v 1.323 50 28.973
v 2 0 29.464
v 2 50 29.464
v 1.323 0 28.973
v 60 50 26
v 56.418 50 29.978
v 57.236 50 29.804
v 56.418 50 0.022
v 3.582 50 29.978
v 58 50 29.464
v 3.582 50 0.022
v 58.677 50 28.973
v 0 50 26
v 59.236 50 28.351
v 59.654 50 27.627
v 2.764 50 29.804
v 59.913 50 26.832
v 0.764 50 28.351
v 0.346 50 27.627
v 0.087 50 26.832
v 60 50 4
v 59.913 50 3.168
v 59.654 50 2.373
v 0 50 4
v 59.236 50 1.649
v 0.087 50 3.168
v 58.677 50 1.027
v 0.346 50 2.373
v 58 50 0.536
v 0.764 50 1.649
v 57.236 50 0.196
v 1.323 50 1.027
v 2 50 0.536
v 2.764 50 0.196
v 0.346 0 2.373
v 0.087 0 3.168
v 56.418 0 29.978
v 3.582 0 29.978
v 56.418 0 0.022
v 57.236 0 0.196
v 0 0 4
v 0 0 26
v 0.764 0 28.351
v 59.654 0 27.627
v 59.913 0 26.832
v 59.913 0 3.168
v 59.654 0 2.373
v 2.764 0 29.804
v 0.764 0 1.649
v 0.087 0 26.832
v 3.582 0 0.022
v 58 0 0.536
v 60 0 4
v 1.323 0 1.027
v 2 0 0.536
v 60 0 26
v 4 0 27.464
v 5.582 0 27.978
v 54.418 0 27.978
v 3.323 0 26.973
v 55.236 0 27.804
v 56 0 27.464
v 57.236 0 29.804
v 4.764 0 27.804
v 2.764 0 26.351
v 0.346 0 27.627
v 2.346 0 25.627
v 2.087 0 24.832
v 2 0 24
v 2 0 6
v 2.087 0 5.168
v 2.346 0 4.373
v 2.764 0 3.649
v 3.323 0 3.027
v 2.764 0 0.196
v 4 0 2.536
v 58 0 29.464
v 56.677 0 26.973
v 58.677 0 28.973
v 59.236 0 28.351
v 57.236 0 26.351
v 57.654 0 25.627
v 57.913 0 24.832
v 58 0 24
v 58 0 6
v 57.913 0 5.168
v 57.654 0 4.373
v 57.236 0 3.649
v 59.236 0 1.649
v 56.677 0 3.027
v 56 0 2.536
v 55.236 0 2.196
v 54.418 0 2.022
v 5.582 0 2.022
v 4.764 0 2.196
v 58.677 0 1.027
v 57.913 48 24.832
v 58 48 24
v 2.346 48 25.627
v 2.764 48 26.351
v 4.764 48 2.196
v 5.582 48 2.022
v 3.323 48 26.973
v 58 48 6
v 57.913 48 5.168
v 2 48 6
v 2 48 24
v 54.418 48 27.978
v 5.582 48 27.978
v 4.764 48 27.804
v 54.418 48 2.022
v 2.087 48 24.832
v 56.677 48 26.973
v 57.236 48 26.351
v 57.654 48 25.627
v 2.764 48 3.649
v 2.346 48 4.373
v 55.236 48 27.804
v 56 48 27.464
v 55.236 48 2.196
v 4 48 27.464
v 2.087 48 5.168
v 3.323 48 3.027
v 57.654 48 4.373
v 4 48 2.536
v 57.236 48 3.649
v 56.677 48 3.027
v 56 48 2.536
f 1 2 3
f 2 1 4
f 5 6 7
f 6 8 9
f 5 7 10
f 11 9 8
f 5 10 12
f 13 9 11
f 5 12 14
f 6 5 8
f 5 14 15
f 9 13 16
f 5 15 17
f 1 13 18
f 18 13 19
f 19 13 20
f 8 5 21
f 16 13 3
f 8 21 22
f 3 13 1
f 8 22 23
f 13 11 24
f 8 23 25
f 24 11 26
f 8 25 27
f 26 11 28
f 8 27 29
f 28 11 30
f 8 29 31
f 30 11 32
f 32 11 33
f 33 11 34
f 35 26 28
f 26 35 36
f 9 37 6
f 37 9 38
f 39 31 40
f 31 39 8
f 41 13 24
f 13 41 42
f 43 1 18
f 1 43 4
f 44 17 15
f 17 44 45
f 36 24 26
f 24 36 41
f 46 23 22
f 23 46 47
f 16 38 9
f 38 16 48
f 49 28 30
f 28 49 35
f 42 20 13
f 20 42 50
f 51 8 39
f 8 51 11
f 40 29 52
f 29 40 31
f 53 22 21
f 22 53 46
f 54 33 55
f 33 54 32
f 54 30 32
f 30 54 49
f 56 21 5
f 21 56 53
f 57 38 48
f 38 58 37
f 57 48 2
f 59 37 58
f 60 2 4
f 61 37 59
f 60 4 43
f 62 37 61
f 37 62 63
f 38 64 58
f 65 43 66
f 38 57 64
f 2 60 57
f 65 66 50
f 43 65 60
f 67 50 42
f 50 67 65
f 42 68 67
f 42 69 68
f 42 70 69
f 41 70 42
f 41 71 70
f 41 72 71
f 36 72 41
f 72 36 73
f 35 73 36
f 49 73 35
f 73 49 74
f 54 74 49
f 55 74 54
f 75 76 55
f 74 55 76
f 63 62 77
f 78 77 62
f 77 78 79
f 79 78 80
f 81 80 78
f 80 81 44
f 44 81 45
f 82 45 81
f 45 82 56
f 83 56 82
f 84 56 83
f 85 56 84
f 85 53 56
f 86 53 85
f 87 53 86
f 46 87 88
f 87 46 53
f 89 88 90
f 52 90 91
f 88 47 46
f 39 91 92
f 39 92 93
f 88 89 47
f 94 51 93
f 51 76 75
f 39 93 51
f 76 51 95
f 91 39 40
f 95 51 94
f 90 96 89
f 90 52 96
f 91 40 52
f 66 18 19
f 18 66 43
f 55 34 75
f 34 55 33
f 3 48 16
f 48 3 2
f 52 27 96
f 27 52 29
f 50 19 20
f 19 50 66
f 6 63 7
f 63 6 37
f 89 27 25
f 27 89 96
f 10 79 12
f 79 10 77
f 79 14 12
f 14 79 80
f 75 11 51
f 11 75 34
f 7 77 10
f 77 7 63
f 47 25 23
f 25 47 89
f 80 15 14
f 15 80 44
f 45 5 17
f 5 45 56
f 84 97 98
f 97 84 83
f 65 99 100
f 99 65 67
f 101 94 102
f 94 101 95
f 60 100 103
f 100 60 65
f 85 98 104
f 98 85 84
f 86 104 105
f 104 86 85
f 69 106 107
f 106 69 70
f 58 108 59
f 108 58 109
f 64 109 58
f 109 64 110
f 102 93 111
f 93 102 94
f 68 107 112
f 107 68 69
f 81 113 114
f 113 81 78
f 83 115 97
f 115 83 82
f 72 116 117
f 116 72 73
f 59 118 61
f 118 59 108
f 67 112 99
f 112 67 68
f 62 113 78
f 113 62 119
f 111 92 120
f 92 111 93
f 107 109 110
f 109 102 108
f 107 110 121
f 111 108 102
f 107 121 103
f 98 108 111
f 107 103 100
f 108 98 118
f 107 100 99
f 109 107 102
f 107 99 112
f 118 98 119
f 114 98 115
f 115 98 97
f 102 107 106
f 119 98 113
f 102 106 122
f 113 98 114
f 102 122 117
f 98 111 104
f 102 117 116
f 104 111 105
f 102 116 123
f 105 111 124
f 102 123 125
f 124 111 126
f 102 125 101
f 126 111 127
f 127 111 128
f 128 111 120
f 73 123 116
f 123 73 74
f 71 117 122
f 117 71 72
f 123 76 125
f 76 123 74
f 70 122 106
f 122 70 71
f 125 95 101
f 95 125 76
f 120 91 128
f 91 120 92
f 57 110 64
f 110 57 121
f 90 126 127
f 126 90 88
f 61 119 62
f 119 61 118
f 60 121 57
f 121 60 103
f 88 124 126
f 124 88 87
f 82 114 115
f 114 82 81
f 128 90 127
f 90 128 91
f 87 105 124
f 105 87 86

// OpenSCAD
$fs=0.1;

DoosH(60,50,30,8,2);

module DoosH(width,depth,height,dia,dikte=3) {
 difference() {
  hull() {
   translate([dia/2,depth,dia/2]) rotate([90,0,0])cylinder(d=dia,h=depth);
   translate([width-dia/2,depth,dia/2]) rotate([90,0,0])cylinder(d=dia,h=depth);
   translate([width-dia/2,depth,height-dia/2]) rotate([90,0,0])cylinder(d=dia,h=depth);
   translate([dia/2,depth,height-dia/2]) rotate([90,0,0])cylinder(d=dia,h=depth);  
  }  
  translate([0,-dikte,0])hull() {
   translate([dia/2+dikte,depth,dia/2+dikte]) rotate([90,0,0])cylinder(d=dia,h=depth);
   translate([width-dia/2-dikte,depth,dia/2+dikte]) rotate([90,0,0])cylinder(d=dia,h=depth);
   translate([width-dia/2-dikte,depth,height-dia/2-dikte]) rotate([90,0,0])cylinder(d=dia,h=depth);
   translate([dia/2+dikte,depth,height-dia/2-dikte]) rotate([90,0,0])cylinder(d=dia,h=depth);  
  }  
 }
}
